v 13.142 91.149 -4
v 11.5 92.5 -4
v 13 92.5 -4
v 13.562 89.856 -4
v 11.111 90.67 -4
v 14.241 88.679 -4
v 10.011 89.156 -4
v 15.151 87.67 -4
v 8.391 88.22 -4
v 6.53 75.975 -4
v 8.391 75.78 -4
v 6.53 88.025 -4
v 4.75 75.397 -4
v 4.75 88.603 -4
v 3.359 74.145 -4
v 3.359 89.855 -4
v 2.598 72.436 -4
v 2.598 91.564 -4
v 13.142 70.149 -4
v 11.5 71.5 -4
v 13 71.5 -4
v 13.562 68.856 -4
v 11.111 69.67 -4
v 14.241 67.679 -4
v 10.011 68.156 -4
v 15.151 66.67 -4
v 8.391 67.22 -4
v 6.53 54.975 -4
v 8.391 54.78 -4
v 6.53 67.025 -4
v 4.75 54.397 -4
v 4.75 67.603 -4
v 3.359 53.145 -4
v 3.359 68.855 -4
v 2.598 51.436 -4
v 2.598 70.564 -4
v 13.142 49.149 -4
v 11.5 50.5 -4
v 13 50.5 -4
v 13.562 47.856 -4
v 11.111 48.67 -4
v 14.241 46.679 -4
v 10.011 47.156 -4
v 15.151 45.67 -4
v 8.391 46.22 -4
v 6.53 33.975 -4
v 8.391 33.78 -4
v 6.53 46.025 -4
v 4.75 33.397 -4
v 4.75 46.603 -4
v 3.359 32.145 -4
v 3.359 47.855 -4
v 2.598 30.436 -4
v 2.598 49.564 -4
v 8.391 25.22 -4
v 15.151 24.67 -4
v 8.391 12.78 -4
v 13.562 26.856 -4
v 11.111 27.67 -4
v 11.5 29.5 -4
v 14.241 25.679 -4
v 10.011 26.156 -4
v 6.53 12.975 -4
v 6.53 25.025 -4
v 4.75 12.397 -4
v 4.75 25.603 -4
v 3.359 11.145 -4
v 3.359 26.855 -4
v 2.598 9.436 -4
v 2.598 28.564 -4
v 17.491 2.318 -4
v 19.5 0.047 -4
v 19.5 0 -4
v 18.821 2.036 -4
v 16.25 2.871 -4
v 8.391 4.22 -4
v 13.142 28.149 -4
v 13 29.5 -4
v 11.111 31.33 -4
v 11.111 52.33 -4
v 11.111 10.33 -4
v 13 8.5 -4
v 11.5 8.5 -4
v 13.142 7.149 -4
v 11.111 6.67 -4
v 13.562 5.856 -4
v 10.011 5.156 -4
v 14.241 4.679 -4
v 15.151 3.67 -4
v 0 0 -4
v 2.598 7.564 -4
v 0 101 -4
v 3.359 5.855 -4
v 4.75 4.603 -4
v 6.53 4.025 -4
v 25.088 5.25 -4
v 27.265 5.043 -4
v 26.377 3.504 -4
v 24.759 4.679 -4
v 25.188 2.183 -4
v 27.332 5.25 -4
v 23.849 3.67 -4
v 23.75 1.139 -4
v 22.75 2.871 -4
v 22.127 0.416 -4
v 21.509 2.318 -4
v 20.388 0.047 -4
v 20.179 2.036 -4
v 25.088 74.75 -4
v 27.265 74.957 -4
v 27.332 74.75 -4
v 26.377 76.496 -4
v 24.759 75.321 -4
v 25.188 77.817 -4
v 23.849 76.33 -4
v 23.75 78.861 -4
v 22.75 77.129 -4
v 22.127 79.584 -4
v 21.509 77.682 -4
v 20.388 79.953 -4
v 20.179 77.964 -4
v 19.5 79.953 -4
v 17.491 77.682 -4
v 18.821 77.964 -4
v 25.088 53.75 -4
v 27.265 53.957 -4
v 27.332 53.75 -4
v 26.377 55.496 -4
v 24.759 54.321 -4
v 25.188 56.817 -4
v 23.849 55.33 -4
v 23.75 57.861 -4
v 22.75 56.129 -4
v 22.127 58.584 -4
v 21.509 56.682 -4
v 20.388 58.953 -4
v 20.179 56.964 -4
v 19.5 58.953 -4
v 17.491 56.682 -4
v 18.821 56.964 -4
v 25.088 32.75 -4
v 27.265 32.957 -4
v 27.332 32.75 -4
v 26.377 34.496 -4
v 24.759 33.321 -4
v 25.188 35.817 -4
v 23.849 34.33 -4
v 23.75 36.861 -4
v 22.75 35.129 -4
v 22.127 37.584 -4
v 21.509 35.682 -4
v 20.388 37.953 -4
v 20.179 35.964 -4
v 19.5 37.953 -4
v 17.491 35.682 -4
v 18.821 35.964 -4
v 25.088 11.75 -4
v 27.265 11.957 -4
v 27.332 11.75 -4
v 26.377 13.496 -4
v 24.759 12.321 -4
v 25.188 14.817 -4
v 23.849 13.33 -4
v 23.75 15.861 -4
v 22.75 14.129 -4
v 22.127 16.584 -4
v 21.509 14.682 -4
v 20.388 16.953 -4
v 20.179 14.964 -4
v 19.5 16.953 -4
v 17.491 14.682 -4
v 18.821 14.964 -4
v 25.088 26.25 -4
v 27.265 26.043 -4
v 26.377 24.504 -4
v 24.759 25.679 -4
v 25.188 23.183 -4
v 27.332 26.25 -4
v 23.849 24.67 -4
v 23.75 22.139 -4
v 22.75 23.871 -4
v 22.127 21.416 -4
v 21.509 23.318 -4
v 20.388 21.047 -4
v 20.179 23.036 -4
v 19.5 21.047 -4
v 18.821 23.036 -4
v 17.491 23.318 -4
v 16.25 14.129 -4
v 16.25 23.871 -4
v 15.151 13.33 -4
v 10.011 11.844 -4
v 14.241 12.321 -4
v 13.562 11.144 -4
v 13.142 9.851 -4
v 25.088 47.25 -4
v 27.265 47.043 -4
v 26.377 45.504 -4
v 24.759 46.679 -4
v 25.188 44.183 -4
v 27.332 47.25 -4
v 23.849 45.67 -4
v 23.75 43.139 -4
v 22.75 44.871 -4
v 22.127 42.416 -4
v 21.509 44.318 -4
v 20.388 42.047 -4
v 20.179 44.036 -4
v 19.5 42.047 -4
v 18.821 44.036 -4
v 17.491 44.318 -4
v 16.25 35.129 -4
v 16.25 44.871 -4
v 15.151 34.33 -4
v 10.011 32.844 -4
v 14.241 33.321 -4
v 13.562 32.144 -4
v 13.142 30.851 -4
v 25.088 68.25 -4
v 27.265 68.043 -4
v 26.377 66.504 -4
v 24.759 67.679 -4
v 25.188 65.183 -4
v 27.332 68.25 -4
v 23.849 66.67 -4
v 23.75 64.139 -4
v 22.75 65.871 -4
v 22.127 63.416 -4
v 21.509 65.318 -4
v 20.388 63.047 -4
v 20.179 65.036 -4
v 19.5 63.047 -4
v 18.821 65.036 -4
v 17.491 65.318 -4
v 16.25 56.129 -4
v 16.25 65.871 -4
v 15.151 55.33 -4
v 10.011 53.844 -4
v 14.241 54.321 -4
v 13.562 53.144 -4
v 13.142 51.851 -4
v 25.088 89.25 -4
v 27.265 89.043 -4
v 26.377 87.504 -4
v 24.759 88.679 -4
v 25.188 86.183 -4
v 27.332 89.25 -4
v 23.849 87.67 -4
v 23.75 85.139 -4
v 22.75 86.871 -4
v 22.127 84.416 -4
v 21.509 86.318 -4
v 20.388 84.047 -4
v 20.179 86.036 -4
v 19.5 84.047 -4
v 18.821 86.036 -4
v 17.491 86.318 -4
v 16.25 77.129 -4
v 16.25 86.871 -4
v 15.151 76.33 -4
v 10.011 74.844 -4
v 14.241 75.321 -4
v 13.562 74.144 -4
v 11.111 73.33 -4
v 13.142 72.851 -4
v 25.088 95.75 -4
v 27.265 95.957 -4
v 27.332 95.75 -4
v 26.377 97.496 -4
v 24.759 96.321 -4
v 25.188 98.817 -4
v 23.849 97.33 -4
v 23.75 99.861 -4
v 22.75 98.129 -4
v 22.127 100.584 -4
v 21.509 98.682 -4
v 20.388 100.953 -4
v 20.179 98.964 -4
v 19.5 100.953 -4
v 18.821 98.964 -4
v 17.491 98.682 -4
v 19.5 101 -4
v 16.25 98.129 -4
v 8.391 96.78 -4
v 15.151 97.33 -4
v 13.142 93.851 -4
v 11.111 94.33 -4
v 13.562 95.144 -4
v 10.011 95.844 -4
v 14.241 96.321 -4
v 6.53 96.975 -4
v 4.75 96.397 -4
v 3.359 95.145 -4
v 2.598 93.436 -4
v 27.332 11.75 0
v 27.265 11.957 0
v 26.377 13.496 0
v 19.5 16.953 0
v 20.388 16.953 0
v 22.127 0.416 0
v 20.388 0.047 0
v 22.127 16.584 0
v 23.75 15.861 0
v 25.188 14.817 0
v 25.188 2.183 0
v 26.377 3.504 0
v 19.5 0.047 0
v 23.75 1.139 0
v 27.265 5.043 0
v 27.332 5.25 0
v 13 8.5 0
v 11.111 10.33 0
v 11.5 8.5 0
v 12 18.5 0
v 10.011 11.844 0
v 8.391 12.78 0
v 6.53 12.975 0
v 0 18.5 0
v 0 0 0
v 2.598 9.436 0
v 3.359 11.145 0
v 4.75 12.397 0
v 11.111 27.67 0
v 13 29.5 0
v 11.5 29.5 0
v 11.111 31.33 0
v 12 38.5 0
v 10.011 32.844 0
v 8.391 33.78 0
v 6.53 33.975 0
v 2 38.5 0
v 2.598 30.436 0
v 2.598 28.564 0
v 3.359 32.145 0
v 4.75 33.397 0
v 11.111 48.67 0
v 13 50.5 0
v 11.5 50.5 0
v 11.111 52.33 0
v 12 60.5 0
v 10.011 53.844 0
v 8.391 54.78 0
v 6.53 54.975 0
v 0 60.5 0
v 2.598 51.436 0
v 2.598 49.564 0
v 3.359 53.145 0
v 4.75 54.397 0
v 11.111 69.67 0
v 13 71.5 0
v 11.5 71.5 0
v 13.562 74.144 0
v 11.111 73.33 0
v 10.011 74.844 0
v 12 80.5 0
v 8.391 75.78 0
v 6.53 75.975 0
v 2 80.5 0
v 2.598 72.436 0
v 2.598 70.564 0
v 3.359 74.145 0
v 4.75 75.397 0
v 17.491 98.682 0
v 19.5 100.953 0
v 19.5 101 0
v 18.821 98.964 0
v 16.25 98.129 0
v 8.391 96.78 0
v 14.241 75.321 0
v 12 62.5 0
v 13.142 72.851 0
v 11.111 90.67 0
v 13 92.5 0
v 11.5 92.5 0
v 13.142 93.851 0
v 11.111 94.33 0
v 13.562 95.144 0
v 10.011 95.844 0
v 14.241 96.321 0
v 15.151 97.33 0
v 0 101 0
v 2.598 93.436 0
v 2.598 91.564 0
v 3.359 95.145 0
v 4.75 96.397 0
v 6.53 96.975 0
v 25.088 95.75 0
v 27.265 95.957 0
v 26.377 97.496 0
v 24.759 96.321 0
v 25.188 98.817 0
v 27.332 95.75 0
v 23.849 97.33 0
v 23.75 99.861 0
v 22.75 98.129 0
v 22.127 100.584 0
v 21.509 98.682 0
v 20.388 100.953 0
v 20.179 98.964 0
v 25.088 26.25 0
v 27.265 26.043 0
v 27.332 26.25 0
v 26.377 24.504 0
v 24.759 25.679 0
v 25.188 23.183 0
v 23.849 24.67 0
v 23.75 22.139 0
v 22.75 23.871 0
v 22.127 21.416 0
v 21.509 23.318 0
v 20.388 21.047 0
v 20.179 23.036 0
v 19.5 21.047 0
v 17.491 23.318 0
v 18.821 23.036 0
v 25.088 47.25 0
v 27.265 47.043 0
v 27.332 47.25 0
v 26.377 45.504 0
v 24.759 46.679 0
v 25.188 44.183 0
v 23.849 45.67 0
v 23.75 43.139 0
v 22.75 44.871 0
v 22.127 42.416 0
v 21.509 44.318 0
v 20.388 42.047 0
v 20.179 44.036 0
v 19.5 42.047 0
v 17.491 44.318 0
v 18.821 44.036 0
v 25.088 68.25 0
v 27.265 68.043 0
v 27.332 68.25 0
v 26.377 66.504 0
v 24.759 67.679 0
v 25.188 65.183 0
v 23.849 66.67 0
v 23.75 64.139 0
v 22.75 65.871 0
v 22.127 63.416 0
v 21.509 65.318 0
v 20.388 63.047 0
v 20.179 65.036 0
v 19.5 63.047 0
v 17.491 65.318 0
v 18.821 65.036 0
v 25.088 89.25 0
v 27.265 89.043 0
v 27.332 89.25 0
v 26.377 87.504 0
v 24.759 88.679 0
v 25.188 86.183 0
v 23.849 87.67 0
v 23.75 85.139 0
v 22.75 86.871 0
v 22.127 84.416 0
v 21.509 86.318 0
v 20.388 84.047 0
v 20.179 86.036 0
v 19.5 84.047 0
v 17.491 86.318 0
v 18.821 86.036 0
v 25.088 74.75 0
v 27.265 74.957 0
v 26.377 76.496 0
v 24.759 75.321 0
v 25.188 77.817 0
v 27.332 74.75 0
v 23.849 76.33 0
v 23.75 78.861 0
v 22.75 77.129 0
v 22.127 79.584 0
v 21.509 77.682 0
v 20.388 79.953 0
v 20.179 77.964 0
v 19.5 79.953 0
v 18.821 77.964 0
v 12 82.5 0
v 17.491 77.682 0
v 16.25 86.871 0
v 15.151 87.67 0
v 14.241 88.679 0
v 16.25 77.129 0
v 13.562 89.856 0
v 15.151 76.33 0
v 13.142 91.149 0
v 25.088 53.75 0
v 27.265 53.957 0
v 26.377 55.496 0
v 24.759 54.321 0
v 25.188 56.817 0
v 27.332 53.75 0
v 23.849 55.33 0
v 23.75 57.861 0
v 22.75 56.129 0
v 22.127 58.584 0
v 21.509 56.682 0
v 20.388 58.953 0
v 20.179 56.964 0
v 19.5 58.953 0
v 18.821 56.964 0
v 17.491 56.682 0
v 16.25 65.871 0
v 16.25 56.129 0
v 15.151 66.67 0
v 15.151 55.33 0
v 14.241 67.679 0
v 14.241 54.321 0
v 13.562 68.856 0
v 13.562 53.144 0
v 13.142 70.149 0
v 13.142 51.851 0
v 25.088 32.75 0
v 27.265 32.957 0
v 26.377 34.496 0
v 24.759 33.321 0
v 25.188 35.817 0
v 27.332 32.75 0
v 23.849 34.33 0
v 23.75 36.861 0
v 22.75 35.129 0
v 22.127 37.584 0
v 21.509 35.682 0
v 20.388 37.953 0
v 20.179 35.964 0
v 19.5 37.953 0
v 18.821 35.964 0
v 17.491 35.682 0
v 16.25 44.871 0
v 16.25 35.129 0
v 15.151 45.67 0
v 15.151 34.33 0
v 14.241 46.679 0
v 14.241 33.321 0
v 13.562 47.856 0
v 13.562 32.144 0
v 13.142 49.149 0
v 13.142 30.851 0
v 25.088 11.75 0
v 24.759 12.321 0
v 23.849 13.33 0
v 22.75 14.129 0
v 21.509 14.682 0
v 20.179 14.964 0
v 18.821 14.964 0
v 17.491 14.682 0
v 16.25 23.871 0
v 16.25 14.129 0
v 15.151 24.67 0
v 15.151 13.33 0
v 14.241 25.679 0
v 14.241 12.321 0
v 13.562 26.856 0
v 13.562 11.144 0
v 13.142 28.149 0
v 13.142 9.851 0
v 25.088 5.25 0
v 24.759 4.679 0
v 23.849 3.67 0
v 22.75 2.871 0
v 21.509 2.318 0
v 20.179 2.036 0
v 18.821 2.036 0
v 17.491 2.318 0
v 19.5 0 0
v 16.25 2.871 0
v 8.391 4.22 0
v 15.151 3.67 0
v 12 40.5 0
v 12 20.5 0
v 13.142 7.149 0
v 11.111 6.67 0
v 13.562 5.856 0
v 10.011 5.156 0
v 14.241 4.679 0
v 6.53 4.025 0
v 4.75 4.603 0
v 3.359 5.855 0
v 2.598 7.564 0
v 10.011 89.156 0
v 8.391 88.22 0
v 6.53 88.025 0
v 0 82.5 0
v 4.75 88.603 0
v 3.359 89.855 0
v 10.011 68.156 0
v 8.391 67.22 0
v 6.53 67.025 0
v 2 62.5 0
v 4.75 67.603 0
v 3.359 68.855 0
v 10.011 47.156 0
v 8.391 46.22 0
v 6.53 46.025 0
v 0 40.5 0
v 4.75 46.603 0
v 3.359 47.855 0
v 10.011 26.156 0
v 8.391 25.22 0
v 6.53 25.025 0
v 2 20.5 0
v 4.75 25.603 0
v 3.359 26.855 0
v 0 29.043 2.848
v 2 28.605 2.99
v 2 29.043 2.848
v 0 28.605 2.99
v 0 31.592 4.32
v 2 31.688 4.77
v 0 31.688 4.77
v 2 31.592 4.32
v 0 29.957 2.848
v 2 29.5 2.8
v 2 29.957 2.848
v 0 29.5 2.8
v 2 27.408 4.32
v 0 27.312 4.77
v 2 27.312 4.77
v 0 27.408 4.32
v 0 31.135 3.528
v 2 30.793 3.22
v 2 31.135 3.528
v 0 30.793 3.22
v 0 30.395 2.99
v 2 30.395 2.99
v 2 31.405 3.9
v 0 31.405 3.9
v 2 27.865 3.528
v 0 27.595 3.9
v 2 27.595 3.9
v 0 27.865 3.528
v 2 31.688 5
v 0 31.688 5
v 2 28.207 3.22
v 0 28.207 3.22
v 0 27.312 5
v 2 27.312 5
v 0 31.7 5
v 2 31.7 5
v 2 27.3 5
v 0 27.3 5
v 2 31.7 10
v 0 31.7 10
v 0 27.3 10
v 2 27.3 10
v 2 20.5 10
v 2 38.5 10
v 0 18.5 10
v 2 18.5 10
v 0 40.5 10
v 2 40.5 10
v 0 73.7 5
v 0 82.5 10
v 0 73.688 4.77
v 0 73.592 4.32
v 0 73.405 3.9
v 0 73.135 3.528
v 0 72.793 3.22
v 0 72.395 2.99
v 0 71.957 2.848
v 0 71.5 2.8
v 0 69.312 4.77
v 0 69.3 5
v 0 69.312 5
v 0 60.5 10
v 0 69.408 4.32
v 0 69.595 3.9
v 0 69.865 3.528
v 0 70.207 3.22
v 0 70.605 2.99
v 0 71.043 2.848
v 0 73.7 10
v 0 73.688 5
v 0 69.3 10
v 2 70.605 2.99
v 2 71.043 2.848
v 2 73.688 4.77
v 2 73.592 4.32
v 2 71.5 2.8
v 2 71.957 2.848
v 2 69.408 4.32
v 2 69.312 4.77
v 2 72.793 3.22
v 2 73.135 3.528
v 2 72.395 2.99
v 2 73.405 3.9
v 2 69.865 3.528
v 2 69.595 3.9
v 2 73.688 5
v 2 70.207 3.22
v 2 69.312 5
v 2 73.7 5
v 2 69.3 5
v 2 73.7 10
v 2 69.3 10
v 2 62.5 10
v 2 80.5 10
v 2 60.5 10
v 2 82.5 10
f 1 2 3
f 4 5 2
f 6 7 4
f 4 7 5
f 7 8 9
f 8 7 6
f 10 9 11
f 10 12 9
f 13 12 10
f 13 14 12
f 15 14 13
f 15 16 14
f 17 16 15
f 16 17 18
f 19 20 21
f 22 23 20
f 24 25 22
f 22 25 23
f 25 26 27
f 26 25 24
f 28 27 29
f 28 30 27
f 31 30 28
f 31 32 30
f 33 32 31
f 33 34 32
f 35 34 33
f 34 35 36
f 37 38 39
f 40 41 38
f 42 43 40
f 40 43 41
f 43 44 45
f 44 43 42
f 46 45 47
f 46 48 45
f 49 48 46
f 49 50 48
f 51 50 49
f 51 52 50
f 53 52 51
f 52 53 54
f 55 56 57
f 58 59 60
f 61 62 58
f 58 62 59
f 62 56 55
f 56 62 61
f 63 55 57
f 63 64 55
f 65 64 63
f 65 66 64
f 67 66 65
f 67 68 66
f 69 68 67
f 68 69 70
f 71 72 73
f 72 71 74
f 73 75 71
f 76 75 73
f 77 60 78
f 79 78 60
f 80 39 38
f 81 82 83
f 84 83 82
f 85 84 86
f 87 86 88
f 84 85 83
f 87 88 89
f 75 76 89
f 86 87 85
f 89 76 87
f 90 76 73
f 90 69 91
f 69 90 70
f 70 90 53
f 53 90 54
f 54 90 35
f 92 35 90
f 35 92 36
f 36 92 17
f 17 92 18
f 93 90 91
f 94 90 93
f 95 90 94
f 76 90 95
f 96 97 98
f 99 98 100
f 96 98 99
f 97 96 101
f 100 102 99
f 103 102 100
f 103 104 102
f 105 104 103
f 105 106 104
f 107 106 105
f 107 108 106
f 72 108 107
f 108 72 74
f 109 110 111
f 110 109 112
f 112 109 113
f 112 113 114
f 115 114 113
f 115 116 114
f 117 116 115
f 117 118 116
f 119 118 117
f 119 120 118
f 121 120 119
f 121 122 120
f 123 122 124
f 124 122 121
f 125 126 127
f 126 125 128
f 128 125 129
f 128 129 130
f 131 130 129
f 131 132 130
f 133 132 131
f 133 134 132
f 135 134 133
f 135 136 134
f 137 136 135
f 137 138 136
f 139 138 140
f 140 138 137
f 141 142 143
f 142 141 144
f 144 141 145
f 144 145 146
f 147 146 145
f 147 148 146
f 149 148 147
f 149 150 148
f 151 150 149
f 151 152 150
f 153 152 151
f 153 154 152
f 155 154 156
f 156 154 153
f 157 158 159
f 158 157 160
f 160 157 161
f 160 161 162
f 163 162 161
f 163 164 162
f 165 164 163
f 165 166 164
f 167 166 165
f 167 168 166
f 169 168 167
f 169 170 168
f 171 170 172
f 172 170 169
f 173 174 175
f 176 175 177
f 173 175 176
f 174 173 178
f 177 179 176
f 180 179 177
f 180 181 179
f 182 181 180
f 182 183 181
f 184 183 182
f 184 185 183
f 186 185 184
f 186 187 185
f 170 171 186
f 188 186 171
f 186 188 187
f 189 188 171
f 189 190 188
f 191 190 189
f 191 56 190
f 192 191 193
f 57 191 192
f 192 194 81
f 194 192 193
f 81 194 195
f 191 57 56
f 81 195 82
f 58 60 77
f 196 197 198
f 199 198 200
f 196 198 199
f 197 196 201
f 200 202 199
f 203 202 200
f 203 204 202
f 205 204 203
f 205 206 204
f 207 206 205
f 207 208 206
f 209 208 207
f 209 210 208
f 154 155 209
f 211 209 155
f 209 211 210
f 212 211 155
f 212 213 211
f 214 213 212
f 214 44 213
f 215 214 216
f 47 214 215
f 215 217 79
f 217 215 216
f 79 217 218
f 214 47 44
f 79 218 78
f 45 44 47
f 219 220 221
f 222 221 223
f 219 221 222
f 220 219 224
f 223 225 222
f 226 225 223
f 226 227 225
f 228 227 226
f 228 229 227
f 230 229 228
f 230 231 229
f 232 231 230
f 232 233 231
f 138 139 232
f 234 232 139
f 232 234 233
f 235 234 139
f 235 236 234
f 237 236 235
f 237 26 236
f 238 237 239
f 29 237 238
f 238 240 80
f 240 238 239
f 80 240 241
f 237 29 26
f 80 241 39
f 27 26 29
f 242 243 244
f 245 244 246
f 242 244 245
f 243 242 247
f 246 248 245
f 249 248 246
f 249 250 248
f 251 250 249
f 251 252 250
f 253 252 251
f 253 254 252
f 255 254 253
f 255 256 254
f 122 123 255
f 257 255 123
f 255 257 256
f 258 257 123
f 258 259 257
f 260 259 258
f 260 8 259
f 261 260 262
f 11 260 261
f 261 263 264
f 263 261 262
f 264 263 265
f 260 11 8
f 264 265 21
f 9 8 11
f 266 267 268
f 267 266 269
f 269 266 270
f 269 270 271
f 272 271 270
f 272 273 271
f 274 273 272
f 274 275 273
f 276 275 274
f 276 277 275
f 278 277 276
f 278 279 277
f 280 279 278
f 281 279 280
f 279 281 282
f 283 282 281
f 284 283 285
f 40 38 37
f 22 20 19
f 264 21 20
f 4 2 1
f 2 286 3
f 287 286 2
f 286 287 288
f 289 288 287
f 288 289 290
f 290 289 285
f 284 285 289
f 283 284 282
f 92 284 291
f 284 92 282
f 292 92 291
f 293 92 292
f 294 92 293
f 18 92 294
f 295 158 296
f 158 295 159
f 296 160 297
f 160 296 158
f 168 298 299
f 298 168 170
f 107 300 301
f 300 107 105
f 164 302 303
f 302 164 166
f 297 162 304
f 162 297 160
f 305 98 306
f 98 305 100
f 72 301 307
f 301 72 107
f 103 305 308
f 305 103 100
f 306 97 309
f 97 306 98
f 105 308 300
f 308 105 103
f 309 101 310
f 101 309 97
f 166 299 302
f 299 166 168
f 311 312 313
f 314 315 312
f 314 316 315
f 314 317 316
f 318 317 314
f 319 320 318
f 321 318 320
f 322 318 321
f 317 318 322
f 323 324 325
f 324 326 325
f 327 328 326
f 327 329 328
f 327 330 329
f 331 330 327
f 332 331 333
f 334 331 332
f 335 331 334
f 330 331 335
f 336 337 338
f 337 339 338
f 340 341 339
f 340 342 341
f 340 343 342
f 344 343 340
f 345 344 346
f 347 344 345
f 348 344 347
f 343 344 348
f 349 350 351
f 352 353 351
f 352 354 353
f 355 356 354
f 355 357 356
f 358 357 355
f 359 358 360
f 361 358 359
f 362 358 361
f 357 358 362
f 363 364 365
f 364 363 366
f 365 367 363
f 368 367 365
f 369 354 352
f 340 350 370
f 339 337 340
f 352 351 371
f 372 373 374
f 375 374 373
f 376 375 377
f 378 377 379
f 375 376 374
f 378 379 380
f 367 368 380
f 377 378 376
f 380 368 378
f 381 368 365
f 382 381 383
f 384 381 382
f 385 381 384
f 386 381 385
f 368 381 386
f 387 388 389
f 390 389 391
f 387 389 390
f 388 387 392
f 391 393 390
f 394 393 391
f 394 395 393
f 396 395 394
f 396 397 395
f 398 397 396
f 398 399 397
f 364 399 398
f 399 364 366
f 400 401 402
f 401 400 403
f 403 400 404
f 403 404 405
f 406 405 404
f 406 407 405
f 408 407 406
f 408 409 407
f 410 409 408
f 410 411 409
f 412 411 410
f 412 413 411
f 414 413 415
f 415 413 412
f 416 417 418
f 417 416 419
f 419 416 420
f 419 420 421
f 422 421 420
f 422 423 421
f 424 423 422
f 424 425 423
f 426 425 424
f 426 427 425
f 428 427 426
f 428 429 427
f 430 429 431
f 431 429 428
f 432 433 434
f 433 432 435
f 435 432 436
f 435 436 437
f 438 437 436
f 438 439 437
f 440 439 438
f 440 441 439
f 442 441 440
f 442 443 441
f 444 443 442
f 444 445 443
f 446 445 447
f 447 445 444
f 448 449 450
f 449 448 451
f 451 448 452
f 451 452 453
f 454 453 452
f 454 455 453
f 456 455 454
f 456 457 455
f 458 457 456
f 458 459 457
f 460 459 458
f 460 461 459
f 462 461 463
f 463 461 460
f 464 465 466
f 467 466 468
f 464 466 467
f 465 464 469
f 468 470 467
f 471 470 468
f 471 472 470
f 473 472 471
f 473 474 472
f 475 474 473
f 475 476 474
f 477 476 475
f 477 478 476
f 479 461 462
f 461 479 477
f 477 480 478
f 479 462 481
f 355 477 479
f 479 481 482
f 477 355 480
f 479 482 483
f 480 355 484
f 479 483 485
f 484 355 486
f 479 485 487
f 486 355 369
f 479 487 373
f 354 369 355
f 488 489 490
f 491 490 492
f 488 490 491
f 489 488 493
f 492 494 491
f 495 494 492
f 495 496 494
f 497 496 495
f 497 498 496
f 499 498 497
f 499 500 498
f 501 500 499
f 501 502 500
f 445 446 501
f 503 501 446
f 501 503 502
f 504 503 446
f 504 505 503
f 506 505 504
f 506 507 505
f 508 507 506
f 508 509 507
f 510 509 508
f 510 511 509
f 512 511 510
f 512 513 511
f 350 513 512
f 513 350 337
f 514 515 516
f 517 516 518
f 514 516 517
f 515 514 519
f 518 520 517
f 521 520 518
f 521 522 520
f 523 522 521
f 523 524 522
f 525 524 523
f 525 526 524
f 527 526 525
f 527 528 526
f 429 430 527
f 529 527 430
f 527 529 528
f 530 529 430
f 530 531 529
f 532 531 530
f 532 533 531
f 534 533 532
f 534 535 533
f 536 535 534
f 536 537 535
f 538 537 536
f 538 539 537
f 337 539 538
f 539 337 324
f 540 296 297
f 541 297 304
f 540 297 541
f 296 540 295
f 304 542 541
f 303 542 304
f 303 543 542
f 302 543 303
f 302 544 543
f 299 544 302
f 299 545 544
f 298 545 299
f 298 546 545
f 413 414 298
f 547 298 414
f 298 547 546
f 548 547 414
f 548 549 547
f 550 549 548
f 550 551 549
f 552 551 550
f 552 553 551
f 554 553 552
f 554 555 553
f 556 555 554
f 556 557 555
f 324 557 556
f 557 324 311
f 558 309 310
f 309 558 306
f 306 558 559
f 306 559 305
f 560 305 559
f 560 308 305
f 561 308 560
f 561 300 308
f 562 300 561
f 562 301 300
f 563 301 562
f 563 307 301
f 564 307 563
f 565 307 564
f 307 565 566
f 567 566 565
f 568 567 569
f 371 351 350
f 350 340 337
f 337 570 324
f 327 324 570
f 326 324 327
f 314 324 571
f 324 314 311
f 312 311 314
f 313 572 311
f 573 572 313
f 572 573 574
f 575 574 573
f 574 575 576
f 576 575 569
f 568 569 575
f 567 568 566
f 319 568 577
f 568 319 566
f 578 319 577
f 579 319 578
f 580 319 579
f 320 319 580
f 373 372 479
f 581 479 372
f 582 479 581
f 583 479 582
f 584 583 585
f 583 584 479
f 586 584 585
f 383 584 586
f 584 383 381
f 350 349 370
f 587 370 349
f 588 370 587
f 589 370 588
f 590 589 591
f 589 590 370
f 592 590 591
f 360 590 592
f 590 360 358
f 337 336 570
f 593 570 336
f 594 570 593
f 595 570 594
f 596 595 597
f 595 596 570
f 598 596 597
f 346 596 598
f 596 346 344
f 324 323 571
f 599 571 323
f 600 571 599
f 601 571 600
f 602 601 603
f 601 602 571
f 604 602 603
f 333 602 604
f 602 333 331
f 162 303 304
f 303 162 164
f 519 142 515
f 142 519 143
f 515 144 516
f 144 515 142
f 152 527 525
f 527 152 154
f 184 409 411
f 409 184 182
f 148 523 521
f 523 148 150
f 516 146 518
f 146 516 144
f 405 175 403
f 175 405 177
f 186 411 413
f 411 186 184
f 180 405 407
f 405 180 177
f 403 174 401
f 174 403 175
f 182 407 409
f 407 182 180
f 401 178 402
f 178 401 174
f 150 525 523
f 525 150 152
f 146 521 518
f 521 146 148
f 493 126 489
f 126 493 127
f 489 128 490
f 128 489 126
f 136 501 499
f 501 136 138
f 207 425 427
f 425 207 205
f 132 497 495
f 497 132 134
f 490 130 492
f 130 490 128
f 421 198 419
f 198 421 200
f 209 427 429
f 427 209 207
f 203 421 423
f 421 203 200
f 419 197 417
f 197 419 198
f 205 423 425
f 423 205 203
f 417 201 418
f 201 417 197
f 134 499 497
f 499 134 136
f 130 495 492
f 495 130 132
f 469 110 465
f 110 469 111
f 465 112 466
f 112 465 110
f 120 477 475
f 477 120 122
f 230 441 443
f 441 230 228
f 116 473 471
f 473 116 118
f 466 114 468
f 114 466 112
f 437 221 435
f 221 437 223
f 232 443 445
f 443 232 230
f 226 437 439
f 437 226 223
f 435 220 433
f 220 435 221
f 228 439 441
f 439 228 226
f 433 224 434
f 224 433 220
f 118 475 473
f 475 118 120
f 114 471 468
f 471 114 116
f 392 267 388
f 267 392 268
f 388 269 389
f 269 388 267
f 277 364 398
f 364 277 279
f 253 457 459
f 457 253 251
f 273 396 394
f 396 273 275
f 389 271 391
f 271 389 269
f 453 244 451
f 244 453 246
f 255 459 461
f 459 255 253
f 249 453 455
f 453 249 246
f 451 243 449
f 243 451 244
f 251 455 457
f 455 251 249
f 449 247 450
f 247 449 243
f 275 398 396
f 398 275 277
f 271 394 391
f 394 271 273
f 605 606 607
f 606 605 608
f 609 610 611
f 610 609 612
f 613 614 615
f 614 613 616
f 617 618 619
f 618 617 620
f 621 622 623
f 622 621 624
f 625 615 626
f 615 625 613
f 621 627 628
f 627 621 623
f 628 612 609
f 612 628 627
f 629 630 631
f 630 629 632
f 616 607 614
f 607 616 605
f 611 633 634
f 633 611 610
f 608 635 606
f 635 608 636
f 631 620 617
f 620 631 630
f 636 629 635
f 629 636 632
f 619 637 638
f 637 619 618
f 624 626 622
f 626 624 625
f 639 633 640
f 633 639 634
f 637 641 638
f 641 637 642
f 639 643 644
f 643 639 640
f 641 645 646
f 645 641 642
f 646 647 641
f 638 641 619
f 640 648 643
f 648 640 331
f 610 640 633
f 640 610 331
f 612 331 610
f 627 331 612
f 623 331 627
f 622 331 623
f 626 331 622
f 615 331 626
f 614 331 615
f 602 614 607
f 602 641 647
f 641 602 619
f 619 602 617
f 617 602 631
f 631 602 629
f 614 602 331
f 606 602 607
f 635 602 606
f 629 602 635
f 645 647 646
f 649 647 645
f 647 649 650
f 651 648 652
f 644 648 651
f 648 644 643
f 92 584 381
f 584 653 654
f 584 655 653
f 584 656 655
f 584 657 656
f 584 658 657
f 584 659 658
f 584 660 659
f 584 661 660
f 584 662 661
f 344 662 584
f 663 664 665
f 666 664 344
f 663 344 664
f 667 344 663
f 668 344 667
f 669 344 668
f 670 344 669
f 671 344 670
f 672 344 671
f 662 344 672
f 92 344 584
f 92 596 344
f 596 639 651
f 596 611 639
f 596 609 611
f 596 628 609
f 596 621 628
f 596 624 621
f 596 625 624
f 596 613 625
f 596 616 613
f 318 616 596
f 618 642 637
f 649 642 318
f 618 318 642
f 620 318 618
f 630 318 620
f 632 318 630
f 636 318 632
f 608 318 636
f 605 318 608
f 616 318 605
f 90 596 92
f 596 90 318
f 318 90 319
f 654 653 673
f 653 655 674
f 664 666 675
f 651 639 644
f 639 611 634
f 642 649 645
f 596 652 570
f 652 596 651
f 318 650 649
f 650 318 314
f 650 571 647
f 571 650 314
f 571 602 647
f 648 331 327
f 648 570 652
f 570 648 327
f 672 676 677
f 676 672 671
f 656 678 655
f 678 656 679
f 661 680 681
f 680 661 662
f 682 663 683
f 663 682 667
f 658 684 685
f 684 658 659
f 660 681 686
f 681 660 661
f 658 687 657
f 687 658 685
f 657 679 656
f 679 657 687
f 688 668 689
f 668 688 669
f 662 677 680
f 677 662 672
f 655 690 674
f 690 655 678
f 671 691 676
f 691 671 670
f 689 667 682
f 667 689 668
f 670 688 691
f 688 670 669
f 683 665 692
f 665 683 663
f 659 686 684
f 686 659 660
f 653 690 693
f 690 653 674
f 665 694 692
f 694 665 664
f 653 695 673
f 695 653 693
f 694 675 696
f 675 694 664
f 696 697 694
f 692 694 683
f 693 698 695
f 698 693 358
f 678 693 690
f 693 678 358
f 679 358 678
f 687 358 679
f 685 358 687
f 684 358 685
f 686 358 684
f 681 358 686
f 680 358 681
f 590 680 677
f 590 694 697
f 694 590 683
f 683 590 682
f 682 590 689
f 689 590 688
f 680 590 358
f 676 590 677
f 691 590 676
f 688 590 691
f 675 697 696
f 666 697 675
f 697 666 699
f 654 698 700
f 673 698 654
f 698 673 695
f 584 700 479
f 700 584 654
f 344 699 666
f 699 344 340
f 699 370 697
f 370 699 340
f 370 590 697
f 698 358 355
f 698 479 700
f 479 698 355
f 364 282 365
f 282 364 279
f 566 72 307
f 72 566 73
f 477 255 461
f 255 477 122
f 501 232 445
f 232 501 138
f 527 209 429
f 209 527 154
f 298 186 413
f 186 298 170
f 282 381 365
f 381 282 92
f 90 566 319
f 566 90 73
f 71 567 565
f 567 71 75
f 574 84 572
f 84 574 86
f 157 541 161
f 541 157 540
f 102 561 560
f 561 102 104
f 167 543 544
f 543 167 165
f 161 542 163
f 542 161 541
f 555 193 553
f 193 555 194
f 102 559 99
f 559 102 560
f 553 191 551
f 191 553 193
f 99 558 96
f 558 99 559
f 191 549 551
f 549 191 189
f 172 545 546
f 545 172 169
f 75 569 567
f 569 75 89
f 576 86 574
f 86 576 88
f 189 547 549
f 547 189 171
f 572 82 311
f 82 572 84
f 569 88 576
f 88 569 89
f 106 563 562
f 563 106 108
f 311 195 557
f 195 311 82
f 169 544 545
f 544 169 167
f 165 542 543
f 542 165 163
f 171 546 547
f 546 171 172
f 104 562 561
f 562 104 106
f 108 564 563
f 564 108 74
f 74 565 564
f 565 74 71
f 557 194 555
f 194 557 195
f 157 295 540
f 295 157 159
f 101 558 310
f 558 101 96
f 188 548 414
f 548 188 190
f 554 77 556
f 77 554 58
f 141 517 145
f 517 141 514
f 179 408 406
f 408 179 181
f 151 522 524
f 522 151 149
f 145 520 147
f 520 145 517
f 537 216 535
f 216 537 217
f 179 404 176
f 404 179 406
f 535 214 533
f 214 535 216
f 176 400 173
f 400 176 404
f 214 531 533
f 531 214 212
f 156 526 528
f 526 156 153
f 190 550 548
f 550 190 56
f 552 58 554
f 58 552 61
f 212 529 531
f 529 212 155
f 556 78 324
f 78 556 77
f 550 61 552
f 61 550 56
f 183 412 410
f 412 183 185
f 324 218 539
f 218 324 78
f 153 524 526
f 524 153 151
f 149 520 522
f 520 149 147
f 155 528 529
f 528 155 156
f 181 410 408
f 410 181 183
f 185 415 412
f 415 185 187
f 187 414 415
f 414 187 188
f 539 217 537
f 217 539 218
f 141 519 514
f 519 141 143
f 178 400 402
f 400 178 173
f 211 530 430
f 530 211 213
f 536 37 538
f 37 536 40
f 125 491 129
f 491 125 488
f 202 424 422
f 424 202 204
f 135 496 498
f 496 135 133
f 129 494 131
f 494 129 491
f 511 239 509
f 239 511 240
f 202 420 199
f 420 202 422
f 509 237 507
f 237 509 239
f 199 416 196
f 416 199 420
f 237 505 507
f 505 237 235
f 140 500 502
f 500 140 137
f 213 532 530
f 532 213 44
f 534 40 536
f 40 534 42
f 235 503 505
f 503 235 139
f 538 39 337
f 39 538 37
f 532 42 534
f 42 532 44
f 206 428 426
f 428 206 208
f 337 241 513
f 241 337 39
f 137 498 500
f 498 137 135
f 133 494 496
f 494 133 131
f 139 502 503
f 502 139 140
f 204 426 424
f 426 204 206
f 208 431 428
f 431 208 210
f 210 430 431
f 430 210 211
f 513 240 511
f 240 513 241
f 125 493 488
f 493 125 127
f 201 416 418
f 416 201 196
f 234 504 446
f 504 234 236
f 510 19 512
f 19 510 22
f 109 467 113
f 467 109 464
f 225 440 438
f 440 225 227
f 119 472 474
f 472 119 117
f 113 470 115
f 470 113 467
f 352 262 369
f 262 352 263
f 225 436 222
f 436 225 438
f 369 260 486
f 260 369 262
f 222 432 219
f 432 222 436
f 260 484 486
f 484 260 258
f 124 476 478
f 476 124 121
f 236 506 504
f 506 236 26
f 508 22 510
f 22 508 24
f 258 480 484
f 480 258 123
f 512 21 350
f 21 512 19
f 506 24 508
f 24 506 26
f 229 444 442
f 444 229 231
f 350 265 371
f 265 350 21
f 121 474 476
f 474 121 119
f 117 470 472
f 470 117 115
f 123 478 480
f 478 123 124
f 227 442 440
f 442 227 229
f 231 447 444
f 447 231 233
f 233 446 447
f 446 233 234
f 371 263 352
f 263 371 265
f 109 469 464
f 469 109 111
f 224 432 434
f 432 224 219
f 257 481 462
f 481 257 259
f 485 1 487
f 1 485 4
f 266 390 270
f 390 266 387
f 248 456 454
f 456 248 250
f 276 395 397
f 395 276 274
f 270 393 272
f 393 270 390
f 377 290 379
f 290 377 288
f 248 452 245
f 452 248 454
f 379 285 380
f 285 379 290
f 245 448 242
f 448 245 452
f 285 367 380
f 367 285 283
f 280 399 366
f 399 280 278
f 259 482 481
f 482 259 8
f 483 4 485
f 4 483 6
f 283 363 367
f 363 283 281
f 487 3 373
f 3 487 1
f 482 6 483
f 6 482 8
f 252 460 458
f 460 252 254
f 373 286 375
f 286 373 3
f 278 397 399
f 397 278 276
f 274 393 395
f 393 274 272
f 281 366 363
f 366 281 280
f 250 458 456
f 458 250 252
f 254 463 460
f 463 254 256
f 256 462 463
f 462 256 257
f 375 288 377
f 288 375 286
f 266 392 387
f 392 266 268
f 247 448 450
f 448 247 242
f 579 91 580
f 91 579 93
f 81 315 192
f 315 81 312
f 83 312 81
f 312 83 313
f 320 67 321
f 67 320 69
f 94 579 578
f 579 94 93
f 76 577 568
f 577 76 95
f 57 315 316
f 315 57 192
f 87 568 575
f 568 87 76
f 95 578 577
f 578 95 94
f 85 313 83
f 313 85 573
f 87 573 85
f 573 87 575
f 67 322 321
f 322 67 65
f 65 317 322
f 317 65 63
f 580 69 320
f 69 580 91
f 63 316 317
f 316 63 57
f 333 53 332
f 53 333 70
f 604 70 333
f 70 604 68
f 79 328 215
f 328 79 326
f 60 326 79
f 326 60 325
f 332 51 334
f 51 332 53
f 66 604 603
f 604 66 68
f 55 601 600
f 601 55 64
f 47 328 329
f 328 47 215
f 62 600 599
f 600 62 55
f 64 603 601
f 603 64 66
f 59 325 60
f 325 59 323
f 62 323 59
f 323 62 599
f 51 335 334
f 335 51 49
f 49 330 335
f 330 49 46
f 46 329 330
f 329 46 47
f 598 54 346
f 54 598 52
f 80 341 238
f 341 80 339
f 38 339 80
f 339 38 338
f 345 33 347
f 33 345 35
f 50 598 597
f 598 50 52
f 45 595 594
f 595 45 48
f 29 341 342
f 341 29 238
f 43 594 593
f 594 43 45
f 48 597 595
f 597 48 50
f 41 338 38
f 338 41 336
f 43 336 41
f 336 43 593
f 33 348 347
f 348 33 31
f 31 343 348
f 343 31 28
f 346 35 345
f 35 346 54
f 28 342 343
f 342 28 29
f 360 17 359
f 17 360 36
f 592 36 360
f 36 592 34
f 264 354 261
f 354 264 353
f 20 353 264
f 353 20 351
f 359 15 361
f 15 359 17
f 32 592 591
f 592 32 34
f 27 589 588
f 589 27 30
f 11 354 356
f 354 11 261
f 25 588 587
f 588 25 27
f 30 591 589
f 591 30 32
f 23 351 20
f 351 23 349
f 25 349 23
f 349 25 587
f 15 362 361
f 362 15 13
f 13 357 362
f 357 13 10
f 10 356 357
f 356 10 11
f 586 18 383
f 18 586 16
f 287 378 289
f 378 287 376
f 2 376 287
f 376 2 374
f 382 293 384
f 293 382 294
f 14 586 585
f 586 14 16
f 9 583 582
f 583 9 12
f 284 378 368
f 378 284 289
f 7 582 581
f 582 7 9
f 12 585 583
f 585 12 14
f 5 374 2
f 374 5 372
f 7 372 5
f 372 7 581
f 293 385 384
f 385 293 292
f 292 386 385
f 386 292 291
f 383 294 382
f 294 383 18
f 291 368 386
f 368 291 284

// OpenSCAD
// Parametric USB Cable Organizer - GuyC

// Dimensions for the ring

ringInnerRadius = 6.5;     // radius of hole
ringThickness   = 2.0;     // wall thickness of rings
ringPadding     = 4.0;     // extra spacing between rings
ringNotch       = 6.5;     // notch wide enough to let cable pass through
ringOuterRadius = ringInnerRadius + ringThickness;

// recess for the DB9 screw shafts on many connectors
recessOffset    = 12.5;    // DB9 has 25mm between screw holes
recessRadius    =  4.5;    

// Dimensions for the buttressed wall-attachment brackets

bracketHeight      = 10.0;  
bracketWall        =  2.0;  // thickness of back wall and buttresses
bracketBaseOffset  = 10.0;  // offset of base of buttress
bracketSlotWidth   =  4.4;  // wide enough for shaft of screw
bracketSlotDepth   =  5.0;  // suggest bracketHeight/2
bracketWidth       = 2*ringOuterRadius+ringPadding+bracketWall/2;

ringOutset         = 11;  // back wall to back edge of hole

// Overall platform size is determined by the depth and number of rings

platformDepth      =  4.0;  // thickness of platform
noRings            =  5;    // number of rings


function ringOrigin(i) = [ringOutset+ringOuterRadius,ringOuterRadius+(ringOuterRadius*2+ringPadding)*i,-platformDepth];

// support()
// Triangular buttress for supporting bracket.

module support()
{
    polyhedron (
	    points = [
 			[0, 0, bracketHeight],
           [0, bracketWall, bracketHeight], 
           [0, bracketWall, 0], 
           [0, 0, 0],
           [bracketBaseOffset, 0, 0],
           [bracketBaseOffset, bracketWall, 0]
        ],
        triangles = [[0,3,2],
                     [0,2,1],
                     [3,0,4],
                     [1,2,5], 
                     [0,5,4],
                     [0,1,5],
                     [5,2,4],
                     [4,2,3],
     ]);
}

// bracket(i)
// Bracket with buttresses and screw slot positioned
// so that it is aligned with the ith ring.  i MUST
// be >=0 and < noRings, but will overhang the platform
// slightly in the first and last positions, so I recommend
// i=1 and i=noRings-2.

// note that the negative geometries for the screw hole extend
// 1mm either side of the bracket to avoid co-incident faces.

module bracket(i)
{

	y = ringOrigin(i)[1];
    translate([0,y,0]) {
  	  difference() {
		// back wall
		translate([0, -bracketWidth/2,0]) 
			cube(size=[bracketWall, bracketWidth, bracketHeight], center=false);
		union() {
			// hole for slot
			translate([-1,0,bracketHeight-bracketSlotDepth]) 
			{
				rotate([0,90,0]) 
	       			cylinder(h=bracketWall+2,r=bracketSlotWidth/2,$fs=0.1);
			}
			// slot
			translate([-1,-bracketSlotWidth/2,bracketHeight-bracketSlotDepth+0])
				cube(size=[bracketWall+2, bracketSlotWidth, bracketSlotDepth+1], center=false);
		}
	  }

  	  // left support
     translate([bracketWall,-bracketWidth/2,0])
		support();
	 // right support
     translate([bracketWall,bracketWidth/2-bracketWall,0])
		support();
	}
}

// platform()
// The rectangular body of the platform.

module platform()
{
	translate([0,0,-platformDepth])
		cube(size=[ringOutset+ringOuterRadius, noRings*2*ringOuterRadius+(noRings-1)*ringPadding, platformDepth]);
}

// ringPositive(i)
// The positive geometry of the ith ring which will be added to the platform()

module ringPositive(i)
{	translate(ringOrigin(i))
		cylinder(h=platformDepth, r=ringOuterRadius, $fs=0.1);
}

// ringNegative(i)
// The negative geometry of the ith ring which will be subtracted from the platform()
// Note that we arbitrarily extend this 2mm above and below the positive geometry
// to ensure that we do not have co-incident faces.

module ringNegative(i)
{
	translate(ringOrigin(i)) {
		translate([0,0,-1]) {
			union() {
				cylinder(h=platformDepth+2, r=ringInnerRadius, $fs=0.1);
				translate([ringOuterRadius/2,0,platformDepth/2+1])
					cube(size=[ringOuterRadius+1,ringNotch,platformDepth+2], center=true);
			}
		}
	}
}

module recess(i)
{
    translate(ringOrigin(i)) {
      translate([-recessOffset,0,-bracketHeight-1]) {
        cylinder(h=platformDepth+bracketHeight*2+2, r=recessRadius);
      }
    }
}


// FINAL GEOMETRY
// We construct the platform and the positive ring geometry, then
// remove the negative ring geometry.

difference() {
	union() {
		platform();
		for(i = [0 : noRings-1]) {
			ringPositive(i);
		}
		// brackets at 2nd and 2nd last position
    	bracket(1);
		if (noRings>3) bracket(noRings-2);
	}
	union() {
		for(i = [0 : noRings-1]) {
			ringNegative(i);
 			recess(i);
		}
	}
}
